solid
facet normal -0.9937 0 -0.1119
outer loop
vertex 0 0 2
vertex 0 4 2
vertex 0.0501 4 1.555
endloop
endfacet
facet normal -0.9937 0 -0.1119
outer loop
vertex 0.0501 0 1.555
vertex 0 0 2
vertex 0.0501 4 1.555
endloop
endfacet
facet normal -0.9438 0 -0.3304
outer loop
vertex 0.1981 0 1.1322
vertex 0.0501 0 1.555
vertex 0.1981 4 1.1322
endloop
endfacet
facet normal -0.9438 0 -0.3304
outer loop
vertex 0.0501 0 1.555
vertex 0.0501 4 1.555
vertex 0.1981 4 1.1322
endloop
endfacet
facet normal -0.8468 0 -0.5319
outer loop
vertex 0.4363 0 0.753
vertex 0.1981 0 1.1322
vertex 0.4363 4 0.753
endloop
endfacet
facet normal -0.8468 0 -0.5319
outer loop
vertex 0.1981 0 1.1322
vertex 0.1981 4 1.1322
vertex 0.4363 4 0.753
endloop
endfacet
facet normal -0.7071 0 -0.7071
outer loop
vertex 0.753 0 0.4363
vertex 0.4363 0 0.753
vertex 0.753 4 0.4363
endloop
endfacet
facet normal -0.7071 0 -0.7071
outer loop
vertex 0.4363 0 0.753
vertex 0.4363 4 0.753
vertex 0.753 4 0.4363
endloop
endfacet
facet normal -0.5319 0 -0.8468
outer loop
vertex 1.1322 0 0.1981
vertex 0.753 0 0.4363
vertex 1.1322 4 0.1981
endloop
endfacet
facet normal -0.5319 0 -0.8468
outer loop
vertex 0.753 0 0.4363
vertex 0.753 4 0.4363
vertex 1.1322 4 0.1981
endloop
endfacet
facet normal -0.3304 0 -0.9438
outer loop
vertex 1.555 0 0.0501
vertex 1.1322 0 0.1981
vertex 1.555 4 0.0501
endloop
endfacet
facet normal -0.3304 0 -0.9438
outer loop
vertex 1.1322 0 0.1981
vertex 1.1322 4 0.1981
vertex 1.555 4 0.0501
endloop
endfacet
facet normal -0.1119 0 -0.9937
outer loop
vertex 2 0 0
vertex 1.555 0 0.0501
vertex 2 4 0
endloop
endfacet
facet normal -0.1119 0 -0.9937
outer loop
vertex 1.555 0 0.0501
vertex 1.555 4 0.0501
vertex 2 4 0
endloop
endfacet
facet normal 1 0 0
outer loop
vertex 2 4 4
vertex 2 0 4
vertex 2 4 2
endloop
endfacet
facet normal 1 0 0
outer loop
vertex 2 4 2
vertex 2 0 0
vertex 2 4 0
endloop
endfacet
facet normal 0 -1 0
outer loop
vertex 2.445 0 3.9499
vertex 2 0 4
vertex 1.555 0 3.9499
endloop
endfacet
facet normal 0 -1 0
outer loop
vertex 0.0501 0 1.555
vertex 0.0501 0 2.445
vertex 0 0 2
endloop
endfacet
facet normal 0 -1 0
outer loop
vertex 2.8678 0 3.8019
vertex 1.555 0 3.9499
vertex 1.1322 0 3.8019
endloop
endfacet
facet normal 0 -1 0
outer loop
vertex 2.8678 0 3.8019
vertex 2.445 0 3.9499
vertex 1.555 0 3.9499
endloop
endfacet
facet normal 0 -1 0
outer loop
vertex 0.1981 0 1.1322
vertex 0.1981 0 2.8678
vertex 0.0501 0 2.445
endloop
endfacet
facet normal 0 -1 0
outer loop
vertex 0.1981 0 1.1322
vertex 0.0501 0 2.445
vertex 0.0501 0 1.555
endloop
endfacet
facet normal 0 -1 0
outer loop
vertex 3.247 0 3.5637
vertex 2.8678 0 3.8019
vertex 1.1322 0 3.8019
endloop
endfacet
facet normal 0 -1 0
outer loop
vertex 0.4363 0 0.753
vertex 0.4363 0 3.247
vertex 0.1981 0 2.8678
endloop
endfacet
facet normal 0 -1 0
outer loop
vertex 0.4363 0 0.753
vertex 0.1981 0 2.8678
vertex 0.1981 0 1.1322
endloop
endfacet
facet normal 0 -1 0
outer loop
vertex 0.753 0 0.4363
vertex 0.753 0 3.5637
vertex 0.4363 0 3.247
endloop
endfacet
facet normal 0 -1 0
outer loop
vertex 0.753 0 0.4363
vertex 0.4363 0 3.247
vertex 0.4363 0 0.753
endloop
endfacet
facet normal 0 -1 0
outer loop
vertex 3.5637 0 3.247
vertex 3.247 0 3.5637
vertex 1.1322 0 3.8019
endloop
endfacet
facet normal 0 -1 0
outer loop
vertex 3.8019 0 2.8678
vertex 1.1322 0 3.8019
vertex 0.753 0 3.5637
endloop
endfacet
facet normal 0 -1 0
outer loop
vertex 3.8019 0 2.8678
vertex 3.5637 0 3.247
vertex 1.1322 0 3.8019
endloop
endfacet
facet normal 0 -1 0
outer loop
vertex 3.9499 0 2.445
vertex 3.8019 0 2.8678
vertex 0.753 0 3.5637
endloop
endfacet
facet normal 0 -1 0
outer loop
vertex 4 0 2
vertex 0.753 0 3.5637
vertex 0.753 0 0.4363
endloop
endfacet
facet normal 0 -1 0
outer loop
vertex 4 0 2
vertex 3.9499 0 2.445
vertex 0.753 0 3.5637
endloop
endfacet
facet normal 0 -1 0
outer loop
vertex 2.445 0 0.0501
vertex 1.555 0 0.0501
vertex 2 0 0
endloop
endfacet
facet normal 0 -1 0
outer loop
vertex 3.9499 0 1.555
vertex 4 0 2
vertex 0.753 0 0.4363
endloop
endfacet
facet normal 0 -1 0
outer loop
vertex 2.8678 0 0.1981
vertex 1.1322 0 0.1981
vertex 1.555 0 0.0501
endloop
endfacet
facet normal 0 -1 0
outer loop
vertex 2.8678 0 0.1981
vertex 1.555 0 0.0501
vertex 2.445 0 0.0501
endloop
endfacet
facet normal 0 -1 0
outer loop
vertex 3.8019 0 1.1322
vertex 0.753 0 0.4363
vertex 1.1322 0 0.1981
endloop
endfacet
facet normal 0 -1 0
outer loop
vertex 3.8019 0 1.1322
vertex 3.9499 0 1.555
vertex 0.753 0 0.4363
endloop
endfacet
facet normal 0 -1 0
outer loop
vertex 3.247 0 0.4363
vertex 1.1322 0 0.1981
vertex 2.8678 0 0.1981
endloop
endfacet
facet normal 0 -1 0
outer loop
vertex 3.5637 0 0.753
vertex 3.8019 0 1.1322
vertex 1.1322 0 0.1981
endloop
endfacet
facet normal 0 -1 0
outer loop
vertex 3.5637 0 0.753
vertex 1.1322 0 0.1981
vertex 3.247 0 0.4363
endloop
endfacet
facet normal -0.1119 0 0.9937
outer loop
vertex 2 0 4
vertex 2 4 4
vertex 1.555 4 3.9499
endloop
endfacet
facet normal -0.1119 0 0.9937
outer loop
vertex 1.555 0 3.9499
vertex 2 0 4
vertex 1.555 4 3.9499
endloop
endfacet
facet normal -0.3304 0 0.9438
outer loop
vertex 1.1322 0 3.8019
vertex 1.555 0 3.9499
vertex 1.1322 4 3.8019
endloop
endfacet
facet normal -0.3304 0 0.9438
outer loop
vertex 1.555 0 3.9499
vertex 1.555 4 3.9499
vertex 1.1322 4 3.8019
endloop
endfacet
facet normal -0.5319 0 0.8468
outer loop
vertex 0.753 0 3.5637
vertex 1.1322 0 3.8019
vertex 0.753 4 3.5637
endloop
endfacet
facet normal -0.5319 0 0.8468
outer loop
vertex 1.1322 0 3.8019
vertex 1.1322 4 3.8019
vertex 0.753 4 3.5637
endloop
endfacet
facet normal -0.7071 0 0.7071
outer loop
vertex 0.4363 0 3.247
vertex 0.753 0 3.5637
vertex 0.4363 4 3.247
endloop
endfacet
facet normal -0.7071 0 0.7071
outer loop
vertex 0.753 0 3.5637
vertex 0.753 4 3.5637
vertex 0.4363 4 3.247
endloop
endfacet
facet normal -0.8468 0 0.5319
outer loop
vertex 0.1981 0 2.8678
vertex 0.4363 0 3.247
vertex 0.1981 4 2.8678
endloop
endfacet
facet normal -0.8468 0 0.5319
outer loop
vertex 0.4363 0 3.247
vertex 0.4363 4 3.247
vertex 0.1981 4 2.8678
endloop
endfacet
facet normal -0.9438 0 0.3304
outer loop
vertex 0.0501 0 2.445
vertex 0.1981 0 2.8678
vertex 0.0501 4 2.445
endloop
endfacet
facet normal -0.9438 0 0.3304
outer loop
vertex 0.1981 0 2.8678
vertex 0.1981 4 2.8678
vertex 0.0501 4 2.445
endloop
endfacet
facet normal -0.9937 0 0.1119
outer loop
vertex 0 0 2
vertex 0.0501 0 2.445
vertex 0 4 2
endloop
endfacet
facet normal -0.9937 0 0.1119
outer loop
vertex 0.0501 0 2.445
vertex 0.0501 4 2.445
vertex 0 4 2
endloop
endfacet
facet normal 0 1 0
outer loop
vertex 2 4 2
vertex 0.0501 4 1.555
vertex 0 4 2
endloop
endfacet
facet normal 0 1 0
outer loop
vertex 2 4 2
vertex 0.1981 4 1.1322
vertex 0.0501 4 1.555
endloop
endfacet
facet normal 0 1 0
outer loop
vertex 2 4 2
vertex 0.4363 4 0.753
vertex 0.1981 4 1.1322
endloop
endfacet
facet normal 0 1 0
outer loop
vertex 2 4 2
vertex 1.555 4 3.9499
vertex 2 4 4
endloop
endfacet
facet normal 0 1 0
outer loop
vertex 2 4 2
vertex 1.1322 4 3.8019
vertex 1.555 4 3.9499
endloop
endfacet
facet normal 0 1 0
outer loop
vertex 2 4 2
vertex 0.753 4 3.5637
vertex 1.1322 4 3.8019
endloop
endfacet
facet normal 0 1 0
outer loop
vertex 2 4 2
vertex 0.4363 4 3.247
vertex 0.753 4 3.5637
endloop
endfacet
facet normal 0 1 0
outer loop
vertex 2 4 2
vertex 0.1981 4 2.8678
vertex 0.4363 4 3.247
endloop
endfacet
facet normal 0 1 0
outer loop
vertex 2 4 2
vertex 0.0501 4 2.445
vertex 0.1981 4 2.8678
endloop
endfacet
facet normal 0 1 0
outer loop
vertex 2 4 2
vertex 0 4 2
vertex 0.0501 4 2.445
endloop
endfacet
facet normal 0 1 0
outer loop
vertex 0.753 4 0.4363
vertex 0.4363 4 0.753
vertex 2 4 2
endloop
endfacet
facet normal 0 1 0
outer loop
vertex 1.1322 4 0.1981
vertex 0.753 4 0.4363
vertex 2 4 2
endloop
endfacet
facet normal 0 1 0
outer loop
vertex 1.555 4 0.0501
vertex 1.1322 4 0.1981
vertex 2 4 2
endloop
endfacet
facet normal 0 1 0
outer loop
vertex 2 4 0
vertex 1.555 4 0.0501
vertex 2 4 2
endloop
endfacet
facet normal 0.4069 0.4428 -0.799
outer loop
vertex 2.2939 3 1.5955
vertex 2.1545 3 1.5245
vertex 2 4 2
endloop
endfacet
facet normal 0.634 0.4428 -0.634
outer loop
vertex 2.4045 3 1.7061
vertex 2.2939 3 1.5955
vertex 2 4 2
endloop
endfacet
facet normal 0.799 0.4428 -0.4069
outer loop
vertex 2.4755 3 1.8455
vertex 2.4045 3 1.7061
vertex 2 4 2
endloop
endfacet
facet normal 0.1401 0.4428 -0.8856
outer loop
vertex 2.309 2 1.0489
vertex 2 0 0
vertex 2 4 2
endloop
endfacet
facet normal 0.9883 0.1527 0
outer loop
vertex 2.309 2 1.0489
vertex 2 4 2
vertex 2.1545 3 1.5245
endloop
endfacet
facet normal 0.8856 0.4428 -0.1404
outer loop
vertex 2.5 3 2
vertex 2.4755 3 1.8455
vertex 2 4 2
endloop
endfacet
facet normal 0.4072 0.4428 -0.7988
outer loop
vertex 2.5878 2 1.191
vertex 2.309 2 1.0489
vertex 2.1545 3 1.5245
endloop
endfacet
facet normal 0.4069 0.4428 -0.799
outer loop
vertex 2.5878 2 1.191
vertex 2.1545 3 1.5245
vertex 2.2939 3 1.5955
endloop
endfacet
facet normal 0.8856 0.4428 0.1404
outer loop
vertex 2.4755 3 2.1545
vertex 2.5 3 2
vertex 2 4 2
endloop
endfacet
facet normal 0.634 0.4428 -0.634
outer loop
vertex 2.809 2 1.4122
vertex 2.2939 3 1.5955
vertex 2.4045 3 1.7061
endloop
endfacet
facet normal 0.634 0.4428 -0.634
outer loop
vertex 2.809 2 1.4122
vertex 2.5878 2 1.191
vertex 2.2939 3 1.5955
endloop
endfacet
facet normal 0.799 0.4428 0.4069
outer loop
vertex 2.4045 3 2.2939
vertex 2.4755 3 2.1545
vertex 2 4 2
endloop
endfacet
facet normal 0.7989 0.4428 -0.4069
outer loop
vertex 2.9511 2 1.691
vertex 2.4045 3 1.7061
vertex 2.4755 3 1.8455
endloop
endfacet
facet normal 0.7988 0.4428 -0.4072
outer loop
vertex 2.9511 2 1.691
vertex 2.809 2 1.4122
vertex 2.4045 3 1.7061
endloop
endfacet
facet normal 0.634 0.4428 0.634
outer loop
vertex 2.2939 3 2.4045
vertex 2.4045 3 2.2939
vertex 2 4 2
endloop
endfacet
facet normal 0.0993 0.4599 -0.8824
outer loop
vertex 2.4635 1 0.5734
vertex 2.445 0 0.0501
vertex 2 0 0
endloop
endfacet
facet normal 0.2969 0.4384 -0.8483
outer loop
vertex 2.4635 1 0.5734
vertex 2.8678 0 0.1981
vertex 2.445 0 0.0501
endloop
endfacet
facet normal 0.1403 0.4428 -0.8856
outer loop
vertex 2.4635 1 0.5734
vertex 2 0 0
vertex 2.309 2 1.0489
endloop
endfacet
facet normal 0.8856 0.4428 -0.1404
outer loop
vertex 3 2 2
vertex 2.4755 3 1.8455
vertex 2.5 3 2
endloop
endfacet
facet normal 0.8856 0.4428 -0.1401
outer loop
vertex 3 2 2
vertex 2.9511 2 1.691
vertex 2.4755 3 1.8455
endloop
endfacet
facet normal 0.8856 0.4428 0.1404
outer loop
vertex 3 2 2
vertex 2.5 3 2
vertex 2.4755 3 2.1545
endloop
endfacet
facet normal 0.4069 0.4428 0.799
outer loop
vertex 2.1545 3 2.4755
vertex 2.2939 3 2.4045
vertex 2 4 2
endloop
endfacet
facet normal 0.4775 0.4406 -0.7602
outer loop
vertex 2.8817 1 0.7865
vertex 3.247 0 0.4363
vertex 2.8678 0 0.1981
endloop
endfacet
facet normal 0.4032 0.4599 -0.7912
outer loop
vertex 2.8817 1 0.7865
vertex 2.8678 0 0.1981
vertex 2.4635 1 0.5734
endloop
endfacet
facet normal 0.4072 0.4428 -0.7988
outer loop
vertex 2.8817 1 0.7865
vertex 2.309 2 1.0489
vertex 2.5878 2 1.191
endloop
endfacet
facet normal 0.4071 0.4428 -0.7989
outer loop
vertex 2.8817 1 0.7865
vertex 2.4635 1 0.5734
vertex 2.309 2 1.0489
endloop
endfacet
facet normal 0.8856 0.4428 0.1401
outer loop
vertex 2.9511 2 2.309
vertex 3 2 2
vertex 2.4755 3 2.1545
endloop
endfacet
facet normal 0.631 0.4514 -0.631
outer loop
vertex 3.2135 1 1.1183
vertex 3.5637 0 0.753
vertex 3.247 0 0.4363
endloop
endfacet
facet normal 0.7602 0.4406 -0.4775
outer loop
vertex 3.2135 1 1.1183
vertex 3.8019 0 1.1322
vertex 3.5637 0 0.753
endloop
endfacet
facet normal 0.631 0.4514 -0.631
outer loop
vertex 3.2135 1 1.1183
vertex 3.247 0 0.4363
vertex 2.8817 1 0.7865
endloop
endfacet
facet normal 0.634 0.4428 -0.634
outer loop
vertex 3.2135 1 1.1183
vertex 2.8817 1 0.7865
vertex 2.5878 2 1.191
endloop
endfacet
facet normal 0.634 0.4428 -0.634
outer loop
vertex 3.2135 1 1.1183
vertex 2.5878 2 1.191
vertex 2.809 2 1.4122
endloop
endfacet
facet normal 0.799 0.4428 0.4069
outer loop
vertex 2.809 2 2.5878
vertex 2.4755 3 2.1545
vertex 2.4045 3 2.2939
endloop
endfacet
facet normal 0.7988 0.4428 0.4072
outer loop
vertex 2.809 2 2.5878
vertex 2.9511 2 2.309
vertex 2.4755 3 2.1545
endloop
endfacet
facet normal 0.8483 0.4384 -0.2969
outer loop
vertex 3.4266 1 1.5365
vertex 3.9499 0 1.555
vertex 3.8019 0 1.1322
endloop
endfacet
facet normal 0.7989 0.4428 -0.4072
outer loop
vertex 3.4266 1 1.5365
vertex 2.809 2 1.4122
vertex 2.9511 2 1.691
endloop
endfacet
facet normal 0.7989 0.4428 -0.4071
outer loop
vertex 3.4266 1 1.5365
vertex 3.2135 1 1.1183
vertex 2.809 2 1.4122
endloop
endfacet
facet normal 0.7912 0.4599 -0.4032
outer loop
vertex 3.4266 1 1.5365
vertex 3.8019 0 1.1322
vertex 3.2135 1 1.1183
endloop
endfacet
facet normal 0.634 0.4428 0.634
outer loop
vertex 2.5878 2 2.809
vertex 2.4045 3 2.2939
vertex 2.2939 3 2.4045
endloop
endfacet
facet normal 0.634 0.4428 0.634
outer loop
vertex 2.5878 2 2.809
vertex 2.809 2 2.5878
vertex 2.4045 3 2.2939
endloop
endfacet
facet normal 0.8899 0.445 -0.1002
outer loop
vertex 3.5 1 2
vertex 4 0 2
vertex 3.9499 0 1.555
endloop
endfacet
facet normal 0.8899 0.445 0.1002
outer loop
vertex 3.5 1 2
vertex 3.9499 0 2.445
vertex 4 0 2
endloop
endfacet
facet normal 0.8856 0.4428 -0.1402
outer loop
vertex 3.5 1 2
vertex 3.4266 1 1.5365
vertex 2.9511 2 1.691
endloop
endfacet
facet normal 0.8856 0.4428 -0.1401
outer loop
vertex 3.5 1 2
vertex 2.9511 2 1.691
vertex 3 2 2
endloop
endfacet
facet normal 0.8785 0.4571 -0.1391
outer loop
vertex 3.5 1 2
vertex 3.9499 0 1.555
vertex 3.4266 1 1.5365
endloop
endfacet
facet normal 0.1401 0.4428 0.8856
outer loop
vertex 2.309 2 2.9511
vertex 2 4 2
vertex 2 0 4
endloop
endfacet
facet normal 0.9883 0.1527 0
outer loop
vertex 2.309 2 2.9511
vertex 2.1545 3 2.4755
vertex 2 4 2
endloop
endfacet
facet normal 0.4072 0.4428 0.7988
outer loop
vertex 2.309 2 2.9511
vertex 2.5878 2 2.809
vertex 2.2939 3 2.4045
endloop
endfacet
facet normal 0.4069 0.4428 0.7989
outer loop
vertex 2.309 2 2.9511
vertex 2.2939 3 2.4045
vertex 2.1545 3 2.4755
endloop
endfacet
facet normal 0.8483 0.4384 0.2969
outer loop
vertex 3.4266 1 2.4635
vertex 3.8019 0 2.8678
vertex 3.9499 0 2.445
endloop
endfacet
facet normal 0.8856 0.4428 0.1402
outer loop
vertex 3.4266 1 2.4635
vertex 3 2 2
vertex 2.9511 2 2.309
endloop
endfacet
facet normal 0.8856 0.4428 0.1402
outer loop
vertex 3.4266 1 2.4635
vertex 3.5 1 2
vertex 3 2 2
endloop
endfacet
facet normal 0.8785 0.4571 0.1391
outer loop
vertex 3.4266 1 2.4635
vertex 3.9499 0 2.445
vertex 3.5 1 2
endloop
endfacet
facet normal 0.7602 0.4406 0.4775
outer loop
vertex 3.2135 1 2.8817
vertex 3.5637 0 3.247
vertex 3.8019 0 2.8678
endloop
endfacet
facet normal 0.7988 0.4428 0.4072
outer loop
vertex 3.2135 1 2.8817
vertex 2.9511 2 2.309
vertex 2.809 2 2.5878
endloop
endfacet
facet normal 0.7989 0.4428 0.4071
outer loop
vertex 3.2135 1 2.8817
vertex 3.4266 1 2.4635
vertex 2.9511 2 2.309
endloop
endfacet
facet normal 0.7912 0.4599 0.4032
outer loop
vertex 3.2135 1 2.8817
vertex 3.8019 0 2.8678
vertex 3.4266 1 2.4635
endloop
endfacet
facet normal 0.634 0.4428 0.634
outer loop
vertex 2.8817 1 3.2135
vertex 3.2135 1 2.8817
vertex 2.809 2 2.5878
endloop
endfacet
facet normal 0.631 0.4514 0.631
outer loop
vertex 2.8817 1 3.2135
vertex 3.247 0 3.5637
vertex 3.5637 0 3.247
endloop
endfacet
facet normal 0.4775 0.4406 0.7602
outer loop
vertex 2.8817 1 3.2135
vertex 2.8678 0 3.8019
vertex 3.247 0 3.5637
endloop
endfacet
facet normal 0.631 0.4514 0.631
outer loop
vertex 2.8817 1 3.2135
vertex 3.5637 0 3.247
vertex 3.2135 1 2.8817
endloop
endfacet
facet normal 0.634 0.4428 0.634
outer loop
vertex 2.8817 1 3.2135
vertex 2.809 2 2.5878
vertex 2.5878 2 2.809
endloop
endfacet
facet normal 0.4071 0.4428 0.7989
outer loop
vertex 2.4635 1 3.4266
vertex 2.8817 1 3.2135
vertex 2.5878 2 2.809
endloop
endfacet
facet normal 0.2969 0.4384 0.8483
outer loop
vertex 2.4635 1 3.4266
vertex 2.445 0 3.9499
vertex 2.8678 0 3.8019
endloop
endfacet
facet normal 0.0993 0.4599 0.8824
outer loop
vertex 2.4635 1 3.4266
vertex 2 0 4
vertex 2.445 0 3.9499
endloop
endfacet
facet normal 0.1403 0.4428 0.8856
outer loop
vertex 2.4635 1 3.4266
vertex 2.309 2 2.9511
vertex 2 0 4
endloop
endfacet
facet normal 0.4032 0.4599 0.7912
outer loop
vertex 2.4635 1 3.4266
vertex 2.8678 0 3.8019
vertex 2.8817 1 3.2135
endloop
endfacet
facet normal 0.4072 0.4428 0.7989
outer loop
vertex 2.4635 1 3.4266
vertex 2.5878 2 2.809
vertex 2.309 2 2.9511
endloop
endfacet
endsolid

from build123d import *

# Parameters (mm, degrees)
SKETCH1_W           = 2
SKETCH1_H           = 4
BOSS_EXTRUDE1_DEPTH = 4
REVOLVE1_ANGLE      = 180
CUT_EXTRUDE1_DEPTH  = 4


with BuildPart() as part:
    # Sketch1 → Boss-Extrude1 (new body)
    with BuildSketch(Plane.XY):
        with Locations((1, 2)):
            Rectangle(SKETCH1_W, SKETCH1_H)
    extrude(amount=BOSS_EXTRUDE1_DEPTH)

    # Sketch2 → Revolve1 (revolve)
    with BuildSketch(Plane(origin=(2, 0, 0), x_dir=(0, 0, -1), z_dir=(1, 0, 0))):
        Polygon((-2, 0), (-2, 4), (0, 0), align=None)
    revolve(axis=Axis((2, 0, 2), (0, -1, 0)), revolution_arc=REVOLVE1_ANGLE)

    # Sketch3 → Cut-Extrude1 (cut)
    with BuildSketch(Plane(origin=(0, 4, 0), x_dir=(1, 0, 0), z_dir=(0, 1, 0))):
        with BuildLine():
            Line((0, -4), (2, -4))
            ThreePointArc((2, -4), (0.585786438, -3.414213562), (0, -2))
            Line((0, -2), (0, -4))
        make_face()
        with BuildLine():
            ThreePointArc((0, -2), (0.585786438, -0.585786438), (2, 0))
            Line((2, 0), (0, 0))
            Line((0, 0), (0, -2))
        make_face()
    extrude(amount=-CUT_EXTRUDE1_DEPTH, mode=Mode.SUBTRACT)


solid = part.part
